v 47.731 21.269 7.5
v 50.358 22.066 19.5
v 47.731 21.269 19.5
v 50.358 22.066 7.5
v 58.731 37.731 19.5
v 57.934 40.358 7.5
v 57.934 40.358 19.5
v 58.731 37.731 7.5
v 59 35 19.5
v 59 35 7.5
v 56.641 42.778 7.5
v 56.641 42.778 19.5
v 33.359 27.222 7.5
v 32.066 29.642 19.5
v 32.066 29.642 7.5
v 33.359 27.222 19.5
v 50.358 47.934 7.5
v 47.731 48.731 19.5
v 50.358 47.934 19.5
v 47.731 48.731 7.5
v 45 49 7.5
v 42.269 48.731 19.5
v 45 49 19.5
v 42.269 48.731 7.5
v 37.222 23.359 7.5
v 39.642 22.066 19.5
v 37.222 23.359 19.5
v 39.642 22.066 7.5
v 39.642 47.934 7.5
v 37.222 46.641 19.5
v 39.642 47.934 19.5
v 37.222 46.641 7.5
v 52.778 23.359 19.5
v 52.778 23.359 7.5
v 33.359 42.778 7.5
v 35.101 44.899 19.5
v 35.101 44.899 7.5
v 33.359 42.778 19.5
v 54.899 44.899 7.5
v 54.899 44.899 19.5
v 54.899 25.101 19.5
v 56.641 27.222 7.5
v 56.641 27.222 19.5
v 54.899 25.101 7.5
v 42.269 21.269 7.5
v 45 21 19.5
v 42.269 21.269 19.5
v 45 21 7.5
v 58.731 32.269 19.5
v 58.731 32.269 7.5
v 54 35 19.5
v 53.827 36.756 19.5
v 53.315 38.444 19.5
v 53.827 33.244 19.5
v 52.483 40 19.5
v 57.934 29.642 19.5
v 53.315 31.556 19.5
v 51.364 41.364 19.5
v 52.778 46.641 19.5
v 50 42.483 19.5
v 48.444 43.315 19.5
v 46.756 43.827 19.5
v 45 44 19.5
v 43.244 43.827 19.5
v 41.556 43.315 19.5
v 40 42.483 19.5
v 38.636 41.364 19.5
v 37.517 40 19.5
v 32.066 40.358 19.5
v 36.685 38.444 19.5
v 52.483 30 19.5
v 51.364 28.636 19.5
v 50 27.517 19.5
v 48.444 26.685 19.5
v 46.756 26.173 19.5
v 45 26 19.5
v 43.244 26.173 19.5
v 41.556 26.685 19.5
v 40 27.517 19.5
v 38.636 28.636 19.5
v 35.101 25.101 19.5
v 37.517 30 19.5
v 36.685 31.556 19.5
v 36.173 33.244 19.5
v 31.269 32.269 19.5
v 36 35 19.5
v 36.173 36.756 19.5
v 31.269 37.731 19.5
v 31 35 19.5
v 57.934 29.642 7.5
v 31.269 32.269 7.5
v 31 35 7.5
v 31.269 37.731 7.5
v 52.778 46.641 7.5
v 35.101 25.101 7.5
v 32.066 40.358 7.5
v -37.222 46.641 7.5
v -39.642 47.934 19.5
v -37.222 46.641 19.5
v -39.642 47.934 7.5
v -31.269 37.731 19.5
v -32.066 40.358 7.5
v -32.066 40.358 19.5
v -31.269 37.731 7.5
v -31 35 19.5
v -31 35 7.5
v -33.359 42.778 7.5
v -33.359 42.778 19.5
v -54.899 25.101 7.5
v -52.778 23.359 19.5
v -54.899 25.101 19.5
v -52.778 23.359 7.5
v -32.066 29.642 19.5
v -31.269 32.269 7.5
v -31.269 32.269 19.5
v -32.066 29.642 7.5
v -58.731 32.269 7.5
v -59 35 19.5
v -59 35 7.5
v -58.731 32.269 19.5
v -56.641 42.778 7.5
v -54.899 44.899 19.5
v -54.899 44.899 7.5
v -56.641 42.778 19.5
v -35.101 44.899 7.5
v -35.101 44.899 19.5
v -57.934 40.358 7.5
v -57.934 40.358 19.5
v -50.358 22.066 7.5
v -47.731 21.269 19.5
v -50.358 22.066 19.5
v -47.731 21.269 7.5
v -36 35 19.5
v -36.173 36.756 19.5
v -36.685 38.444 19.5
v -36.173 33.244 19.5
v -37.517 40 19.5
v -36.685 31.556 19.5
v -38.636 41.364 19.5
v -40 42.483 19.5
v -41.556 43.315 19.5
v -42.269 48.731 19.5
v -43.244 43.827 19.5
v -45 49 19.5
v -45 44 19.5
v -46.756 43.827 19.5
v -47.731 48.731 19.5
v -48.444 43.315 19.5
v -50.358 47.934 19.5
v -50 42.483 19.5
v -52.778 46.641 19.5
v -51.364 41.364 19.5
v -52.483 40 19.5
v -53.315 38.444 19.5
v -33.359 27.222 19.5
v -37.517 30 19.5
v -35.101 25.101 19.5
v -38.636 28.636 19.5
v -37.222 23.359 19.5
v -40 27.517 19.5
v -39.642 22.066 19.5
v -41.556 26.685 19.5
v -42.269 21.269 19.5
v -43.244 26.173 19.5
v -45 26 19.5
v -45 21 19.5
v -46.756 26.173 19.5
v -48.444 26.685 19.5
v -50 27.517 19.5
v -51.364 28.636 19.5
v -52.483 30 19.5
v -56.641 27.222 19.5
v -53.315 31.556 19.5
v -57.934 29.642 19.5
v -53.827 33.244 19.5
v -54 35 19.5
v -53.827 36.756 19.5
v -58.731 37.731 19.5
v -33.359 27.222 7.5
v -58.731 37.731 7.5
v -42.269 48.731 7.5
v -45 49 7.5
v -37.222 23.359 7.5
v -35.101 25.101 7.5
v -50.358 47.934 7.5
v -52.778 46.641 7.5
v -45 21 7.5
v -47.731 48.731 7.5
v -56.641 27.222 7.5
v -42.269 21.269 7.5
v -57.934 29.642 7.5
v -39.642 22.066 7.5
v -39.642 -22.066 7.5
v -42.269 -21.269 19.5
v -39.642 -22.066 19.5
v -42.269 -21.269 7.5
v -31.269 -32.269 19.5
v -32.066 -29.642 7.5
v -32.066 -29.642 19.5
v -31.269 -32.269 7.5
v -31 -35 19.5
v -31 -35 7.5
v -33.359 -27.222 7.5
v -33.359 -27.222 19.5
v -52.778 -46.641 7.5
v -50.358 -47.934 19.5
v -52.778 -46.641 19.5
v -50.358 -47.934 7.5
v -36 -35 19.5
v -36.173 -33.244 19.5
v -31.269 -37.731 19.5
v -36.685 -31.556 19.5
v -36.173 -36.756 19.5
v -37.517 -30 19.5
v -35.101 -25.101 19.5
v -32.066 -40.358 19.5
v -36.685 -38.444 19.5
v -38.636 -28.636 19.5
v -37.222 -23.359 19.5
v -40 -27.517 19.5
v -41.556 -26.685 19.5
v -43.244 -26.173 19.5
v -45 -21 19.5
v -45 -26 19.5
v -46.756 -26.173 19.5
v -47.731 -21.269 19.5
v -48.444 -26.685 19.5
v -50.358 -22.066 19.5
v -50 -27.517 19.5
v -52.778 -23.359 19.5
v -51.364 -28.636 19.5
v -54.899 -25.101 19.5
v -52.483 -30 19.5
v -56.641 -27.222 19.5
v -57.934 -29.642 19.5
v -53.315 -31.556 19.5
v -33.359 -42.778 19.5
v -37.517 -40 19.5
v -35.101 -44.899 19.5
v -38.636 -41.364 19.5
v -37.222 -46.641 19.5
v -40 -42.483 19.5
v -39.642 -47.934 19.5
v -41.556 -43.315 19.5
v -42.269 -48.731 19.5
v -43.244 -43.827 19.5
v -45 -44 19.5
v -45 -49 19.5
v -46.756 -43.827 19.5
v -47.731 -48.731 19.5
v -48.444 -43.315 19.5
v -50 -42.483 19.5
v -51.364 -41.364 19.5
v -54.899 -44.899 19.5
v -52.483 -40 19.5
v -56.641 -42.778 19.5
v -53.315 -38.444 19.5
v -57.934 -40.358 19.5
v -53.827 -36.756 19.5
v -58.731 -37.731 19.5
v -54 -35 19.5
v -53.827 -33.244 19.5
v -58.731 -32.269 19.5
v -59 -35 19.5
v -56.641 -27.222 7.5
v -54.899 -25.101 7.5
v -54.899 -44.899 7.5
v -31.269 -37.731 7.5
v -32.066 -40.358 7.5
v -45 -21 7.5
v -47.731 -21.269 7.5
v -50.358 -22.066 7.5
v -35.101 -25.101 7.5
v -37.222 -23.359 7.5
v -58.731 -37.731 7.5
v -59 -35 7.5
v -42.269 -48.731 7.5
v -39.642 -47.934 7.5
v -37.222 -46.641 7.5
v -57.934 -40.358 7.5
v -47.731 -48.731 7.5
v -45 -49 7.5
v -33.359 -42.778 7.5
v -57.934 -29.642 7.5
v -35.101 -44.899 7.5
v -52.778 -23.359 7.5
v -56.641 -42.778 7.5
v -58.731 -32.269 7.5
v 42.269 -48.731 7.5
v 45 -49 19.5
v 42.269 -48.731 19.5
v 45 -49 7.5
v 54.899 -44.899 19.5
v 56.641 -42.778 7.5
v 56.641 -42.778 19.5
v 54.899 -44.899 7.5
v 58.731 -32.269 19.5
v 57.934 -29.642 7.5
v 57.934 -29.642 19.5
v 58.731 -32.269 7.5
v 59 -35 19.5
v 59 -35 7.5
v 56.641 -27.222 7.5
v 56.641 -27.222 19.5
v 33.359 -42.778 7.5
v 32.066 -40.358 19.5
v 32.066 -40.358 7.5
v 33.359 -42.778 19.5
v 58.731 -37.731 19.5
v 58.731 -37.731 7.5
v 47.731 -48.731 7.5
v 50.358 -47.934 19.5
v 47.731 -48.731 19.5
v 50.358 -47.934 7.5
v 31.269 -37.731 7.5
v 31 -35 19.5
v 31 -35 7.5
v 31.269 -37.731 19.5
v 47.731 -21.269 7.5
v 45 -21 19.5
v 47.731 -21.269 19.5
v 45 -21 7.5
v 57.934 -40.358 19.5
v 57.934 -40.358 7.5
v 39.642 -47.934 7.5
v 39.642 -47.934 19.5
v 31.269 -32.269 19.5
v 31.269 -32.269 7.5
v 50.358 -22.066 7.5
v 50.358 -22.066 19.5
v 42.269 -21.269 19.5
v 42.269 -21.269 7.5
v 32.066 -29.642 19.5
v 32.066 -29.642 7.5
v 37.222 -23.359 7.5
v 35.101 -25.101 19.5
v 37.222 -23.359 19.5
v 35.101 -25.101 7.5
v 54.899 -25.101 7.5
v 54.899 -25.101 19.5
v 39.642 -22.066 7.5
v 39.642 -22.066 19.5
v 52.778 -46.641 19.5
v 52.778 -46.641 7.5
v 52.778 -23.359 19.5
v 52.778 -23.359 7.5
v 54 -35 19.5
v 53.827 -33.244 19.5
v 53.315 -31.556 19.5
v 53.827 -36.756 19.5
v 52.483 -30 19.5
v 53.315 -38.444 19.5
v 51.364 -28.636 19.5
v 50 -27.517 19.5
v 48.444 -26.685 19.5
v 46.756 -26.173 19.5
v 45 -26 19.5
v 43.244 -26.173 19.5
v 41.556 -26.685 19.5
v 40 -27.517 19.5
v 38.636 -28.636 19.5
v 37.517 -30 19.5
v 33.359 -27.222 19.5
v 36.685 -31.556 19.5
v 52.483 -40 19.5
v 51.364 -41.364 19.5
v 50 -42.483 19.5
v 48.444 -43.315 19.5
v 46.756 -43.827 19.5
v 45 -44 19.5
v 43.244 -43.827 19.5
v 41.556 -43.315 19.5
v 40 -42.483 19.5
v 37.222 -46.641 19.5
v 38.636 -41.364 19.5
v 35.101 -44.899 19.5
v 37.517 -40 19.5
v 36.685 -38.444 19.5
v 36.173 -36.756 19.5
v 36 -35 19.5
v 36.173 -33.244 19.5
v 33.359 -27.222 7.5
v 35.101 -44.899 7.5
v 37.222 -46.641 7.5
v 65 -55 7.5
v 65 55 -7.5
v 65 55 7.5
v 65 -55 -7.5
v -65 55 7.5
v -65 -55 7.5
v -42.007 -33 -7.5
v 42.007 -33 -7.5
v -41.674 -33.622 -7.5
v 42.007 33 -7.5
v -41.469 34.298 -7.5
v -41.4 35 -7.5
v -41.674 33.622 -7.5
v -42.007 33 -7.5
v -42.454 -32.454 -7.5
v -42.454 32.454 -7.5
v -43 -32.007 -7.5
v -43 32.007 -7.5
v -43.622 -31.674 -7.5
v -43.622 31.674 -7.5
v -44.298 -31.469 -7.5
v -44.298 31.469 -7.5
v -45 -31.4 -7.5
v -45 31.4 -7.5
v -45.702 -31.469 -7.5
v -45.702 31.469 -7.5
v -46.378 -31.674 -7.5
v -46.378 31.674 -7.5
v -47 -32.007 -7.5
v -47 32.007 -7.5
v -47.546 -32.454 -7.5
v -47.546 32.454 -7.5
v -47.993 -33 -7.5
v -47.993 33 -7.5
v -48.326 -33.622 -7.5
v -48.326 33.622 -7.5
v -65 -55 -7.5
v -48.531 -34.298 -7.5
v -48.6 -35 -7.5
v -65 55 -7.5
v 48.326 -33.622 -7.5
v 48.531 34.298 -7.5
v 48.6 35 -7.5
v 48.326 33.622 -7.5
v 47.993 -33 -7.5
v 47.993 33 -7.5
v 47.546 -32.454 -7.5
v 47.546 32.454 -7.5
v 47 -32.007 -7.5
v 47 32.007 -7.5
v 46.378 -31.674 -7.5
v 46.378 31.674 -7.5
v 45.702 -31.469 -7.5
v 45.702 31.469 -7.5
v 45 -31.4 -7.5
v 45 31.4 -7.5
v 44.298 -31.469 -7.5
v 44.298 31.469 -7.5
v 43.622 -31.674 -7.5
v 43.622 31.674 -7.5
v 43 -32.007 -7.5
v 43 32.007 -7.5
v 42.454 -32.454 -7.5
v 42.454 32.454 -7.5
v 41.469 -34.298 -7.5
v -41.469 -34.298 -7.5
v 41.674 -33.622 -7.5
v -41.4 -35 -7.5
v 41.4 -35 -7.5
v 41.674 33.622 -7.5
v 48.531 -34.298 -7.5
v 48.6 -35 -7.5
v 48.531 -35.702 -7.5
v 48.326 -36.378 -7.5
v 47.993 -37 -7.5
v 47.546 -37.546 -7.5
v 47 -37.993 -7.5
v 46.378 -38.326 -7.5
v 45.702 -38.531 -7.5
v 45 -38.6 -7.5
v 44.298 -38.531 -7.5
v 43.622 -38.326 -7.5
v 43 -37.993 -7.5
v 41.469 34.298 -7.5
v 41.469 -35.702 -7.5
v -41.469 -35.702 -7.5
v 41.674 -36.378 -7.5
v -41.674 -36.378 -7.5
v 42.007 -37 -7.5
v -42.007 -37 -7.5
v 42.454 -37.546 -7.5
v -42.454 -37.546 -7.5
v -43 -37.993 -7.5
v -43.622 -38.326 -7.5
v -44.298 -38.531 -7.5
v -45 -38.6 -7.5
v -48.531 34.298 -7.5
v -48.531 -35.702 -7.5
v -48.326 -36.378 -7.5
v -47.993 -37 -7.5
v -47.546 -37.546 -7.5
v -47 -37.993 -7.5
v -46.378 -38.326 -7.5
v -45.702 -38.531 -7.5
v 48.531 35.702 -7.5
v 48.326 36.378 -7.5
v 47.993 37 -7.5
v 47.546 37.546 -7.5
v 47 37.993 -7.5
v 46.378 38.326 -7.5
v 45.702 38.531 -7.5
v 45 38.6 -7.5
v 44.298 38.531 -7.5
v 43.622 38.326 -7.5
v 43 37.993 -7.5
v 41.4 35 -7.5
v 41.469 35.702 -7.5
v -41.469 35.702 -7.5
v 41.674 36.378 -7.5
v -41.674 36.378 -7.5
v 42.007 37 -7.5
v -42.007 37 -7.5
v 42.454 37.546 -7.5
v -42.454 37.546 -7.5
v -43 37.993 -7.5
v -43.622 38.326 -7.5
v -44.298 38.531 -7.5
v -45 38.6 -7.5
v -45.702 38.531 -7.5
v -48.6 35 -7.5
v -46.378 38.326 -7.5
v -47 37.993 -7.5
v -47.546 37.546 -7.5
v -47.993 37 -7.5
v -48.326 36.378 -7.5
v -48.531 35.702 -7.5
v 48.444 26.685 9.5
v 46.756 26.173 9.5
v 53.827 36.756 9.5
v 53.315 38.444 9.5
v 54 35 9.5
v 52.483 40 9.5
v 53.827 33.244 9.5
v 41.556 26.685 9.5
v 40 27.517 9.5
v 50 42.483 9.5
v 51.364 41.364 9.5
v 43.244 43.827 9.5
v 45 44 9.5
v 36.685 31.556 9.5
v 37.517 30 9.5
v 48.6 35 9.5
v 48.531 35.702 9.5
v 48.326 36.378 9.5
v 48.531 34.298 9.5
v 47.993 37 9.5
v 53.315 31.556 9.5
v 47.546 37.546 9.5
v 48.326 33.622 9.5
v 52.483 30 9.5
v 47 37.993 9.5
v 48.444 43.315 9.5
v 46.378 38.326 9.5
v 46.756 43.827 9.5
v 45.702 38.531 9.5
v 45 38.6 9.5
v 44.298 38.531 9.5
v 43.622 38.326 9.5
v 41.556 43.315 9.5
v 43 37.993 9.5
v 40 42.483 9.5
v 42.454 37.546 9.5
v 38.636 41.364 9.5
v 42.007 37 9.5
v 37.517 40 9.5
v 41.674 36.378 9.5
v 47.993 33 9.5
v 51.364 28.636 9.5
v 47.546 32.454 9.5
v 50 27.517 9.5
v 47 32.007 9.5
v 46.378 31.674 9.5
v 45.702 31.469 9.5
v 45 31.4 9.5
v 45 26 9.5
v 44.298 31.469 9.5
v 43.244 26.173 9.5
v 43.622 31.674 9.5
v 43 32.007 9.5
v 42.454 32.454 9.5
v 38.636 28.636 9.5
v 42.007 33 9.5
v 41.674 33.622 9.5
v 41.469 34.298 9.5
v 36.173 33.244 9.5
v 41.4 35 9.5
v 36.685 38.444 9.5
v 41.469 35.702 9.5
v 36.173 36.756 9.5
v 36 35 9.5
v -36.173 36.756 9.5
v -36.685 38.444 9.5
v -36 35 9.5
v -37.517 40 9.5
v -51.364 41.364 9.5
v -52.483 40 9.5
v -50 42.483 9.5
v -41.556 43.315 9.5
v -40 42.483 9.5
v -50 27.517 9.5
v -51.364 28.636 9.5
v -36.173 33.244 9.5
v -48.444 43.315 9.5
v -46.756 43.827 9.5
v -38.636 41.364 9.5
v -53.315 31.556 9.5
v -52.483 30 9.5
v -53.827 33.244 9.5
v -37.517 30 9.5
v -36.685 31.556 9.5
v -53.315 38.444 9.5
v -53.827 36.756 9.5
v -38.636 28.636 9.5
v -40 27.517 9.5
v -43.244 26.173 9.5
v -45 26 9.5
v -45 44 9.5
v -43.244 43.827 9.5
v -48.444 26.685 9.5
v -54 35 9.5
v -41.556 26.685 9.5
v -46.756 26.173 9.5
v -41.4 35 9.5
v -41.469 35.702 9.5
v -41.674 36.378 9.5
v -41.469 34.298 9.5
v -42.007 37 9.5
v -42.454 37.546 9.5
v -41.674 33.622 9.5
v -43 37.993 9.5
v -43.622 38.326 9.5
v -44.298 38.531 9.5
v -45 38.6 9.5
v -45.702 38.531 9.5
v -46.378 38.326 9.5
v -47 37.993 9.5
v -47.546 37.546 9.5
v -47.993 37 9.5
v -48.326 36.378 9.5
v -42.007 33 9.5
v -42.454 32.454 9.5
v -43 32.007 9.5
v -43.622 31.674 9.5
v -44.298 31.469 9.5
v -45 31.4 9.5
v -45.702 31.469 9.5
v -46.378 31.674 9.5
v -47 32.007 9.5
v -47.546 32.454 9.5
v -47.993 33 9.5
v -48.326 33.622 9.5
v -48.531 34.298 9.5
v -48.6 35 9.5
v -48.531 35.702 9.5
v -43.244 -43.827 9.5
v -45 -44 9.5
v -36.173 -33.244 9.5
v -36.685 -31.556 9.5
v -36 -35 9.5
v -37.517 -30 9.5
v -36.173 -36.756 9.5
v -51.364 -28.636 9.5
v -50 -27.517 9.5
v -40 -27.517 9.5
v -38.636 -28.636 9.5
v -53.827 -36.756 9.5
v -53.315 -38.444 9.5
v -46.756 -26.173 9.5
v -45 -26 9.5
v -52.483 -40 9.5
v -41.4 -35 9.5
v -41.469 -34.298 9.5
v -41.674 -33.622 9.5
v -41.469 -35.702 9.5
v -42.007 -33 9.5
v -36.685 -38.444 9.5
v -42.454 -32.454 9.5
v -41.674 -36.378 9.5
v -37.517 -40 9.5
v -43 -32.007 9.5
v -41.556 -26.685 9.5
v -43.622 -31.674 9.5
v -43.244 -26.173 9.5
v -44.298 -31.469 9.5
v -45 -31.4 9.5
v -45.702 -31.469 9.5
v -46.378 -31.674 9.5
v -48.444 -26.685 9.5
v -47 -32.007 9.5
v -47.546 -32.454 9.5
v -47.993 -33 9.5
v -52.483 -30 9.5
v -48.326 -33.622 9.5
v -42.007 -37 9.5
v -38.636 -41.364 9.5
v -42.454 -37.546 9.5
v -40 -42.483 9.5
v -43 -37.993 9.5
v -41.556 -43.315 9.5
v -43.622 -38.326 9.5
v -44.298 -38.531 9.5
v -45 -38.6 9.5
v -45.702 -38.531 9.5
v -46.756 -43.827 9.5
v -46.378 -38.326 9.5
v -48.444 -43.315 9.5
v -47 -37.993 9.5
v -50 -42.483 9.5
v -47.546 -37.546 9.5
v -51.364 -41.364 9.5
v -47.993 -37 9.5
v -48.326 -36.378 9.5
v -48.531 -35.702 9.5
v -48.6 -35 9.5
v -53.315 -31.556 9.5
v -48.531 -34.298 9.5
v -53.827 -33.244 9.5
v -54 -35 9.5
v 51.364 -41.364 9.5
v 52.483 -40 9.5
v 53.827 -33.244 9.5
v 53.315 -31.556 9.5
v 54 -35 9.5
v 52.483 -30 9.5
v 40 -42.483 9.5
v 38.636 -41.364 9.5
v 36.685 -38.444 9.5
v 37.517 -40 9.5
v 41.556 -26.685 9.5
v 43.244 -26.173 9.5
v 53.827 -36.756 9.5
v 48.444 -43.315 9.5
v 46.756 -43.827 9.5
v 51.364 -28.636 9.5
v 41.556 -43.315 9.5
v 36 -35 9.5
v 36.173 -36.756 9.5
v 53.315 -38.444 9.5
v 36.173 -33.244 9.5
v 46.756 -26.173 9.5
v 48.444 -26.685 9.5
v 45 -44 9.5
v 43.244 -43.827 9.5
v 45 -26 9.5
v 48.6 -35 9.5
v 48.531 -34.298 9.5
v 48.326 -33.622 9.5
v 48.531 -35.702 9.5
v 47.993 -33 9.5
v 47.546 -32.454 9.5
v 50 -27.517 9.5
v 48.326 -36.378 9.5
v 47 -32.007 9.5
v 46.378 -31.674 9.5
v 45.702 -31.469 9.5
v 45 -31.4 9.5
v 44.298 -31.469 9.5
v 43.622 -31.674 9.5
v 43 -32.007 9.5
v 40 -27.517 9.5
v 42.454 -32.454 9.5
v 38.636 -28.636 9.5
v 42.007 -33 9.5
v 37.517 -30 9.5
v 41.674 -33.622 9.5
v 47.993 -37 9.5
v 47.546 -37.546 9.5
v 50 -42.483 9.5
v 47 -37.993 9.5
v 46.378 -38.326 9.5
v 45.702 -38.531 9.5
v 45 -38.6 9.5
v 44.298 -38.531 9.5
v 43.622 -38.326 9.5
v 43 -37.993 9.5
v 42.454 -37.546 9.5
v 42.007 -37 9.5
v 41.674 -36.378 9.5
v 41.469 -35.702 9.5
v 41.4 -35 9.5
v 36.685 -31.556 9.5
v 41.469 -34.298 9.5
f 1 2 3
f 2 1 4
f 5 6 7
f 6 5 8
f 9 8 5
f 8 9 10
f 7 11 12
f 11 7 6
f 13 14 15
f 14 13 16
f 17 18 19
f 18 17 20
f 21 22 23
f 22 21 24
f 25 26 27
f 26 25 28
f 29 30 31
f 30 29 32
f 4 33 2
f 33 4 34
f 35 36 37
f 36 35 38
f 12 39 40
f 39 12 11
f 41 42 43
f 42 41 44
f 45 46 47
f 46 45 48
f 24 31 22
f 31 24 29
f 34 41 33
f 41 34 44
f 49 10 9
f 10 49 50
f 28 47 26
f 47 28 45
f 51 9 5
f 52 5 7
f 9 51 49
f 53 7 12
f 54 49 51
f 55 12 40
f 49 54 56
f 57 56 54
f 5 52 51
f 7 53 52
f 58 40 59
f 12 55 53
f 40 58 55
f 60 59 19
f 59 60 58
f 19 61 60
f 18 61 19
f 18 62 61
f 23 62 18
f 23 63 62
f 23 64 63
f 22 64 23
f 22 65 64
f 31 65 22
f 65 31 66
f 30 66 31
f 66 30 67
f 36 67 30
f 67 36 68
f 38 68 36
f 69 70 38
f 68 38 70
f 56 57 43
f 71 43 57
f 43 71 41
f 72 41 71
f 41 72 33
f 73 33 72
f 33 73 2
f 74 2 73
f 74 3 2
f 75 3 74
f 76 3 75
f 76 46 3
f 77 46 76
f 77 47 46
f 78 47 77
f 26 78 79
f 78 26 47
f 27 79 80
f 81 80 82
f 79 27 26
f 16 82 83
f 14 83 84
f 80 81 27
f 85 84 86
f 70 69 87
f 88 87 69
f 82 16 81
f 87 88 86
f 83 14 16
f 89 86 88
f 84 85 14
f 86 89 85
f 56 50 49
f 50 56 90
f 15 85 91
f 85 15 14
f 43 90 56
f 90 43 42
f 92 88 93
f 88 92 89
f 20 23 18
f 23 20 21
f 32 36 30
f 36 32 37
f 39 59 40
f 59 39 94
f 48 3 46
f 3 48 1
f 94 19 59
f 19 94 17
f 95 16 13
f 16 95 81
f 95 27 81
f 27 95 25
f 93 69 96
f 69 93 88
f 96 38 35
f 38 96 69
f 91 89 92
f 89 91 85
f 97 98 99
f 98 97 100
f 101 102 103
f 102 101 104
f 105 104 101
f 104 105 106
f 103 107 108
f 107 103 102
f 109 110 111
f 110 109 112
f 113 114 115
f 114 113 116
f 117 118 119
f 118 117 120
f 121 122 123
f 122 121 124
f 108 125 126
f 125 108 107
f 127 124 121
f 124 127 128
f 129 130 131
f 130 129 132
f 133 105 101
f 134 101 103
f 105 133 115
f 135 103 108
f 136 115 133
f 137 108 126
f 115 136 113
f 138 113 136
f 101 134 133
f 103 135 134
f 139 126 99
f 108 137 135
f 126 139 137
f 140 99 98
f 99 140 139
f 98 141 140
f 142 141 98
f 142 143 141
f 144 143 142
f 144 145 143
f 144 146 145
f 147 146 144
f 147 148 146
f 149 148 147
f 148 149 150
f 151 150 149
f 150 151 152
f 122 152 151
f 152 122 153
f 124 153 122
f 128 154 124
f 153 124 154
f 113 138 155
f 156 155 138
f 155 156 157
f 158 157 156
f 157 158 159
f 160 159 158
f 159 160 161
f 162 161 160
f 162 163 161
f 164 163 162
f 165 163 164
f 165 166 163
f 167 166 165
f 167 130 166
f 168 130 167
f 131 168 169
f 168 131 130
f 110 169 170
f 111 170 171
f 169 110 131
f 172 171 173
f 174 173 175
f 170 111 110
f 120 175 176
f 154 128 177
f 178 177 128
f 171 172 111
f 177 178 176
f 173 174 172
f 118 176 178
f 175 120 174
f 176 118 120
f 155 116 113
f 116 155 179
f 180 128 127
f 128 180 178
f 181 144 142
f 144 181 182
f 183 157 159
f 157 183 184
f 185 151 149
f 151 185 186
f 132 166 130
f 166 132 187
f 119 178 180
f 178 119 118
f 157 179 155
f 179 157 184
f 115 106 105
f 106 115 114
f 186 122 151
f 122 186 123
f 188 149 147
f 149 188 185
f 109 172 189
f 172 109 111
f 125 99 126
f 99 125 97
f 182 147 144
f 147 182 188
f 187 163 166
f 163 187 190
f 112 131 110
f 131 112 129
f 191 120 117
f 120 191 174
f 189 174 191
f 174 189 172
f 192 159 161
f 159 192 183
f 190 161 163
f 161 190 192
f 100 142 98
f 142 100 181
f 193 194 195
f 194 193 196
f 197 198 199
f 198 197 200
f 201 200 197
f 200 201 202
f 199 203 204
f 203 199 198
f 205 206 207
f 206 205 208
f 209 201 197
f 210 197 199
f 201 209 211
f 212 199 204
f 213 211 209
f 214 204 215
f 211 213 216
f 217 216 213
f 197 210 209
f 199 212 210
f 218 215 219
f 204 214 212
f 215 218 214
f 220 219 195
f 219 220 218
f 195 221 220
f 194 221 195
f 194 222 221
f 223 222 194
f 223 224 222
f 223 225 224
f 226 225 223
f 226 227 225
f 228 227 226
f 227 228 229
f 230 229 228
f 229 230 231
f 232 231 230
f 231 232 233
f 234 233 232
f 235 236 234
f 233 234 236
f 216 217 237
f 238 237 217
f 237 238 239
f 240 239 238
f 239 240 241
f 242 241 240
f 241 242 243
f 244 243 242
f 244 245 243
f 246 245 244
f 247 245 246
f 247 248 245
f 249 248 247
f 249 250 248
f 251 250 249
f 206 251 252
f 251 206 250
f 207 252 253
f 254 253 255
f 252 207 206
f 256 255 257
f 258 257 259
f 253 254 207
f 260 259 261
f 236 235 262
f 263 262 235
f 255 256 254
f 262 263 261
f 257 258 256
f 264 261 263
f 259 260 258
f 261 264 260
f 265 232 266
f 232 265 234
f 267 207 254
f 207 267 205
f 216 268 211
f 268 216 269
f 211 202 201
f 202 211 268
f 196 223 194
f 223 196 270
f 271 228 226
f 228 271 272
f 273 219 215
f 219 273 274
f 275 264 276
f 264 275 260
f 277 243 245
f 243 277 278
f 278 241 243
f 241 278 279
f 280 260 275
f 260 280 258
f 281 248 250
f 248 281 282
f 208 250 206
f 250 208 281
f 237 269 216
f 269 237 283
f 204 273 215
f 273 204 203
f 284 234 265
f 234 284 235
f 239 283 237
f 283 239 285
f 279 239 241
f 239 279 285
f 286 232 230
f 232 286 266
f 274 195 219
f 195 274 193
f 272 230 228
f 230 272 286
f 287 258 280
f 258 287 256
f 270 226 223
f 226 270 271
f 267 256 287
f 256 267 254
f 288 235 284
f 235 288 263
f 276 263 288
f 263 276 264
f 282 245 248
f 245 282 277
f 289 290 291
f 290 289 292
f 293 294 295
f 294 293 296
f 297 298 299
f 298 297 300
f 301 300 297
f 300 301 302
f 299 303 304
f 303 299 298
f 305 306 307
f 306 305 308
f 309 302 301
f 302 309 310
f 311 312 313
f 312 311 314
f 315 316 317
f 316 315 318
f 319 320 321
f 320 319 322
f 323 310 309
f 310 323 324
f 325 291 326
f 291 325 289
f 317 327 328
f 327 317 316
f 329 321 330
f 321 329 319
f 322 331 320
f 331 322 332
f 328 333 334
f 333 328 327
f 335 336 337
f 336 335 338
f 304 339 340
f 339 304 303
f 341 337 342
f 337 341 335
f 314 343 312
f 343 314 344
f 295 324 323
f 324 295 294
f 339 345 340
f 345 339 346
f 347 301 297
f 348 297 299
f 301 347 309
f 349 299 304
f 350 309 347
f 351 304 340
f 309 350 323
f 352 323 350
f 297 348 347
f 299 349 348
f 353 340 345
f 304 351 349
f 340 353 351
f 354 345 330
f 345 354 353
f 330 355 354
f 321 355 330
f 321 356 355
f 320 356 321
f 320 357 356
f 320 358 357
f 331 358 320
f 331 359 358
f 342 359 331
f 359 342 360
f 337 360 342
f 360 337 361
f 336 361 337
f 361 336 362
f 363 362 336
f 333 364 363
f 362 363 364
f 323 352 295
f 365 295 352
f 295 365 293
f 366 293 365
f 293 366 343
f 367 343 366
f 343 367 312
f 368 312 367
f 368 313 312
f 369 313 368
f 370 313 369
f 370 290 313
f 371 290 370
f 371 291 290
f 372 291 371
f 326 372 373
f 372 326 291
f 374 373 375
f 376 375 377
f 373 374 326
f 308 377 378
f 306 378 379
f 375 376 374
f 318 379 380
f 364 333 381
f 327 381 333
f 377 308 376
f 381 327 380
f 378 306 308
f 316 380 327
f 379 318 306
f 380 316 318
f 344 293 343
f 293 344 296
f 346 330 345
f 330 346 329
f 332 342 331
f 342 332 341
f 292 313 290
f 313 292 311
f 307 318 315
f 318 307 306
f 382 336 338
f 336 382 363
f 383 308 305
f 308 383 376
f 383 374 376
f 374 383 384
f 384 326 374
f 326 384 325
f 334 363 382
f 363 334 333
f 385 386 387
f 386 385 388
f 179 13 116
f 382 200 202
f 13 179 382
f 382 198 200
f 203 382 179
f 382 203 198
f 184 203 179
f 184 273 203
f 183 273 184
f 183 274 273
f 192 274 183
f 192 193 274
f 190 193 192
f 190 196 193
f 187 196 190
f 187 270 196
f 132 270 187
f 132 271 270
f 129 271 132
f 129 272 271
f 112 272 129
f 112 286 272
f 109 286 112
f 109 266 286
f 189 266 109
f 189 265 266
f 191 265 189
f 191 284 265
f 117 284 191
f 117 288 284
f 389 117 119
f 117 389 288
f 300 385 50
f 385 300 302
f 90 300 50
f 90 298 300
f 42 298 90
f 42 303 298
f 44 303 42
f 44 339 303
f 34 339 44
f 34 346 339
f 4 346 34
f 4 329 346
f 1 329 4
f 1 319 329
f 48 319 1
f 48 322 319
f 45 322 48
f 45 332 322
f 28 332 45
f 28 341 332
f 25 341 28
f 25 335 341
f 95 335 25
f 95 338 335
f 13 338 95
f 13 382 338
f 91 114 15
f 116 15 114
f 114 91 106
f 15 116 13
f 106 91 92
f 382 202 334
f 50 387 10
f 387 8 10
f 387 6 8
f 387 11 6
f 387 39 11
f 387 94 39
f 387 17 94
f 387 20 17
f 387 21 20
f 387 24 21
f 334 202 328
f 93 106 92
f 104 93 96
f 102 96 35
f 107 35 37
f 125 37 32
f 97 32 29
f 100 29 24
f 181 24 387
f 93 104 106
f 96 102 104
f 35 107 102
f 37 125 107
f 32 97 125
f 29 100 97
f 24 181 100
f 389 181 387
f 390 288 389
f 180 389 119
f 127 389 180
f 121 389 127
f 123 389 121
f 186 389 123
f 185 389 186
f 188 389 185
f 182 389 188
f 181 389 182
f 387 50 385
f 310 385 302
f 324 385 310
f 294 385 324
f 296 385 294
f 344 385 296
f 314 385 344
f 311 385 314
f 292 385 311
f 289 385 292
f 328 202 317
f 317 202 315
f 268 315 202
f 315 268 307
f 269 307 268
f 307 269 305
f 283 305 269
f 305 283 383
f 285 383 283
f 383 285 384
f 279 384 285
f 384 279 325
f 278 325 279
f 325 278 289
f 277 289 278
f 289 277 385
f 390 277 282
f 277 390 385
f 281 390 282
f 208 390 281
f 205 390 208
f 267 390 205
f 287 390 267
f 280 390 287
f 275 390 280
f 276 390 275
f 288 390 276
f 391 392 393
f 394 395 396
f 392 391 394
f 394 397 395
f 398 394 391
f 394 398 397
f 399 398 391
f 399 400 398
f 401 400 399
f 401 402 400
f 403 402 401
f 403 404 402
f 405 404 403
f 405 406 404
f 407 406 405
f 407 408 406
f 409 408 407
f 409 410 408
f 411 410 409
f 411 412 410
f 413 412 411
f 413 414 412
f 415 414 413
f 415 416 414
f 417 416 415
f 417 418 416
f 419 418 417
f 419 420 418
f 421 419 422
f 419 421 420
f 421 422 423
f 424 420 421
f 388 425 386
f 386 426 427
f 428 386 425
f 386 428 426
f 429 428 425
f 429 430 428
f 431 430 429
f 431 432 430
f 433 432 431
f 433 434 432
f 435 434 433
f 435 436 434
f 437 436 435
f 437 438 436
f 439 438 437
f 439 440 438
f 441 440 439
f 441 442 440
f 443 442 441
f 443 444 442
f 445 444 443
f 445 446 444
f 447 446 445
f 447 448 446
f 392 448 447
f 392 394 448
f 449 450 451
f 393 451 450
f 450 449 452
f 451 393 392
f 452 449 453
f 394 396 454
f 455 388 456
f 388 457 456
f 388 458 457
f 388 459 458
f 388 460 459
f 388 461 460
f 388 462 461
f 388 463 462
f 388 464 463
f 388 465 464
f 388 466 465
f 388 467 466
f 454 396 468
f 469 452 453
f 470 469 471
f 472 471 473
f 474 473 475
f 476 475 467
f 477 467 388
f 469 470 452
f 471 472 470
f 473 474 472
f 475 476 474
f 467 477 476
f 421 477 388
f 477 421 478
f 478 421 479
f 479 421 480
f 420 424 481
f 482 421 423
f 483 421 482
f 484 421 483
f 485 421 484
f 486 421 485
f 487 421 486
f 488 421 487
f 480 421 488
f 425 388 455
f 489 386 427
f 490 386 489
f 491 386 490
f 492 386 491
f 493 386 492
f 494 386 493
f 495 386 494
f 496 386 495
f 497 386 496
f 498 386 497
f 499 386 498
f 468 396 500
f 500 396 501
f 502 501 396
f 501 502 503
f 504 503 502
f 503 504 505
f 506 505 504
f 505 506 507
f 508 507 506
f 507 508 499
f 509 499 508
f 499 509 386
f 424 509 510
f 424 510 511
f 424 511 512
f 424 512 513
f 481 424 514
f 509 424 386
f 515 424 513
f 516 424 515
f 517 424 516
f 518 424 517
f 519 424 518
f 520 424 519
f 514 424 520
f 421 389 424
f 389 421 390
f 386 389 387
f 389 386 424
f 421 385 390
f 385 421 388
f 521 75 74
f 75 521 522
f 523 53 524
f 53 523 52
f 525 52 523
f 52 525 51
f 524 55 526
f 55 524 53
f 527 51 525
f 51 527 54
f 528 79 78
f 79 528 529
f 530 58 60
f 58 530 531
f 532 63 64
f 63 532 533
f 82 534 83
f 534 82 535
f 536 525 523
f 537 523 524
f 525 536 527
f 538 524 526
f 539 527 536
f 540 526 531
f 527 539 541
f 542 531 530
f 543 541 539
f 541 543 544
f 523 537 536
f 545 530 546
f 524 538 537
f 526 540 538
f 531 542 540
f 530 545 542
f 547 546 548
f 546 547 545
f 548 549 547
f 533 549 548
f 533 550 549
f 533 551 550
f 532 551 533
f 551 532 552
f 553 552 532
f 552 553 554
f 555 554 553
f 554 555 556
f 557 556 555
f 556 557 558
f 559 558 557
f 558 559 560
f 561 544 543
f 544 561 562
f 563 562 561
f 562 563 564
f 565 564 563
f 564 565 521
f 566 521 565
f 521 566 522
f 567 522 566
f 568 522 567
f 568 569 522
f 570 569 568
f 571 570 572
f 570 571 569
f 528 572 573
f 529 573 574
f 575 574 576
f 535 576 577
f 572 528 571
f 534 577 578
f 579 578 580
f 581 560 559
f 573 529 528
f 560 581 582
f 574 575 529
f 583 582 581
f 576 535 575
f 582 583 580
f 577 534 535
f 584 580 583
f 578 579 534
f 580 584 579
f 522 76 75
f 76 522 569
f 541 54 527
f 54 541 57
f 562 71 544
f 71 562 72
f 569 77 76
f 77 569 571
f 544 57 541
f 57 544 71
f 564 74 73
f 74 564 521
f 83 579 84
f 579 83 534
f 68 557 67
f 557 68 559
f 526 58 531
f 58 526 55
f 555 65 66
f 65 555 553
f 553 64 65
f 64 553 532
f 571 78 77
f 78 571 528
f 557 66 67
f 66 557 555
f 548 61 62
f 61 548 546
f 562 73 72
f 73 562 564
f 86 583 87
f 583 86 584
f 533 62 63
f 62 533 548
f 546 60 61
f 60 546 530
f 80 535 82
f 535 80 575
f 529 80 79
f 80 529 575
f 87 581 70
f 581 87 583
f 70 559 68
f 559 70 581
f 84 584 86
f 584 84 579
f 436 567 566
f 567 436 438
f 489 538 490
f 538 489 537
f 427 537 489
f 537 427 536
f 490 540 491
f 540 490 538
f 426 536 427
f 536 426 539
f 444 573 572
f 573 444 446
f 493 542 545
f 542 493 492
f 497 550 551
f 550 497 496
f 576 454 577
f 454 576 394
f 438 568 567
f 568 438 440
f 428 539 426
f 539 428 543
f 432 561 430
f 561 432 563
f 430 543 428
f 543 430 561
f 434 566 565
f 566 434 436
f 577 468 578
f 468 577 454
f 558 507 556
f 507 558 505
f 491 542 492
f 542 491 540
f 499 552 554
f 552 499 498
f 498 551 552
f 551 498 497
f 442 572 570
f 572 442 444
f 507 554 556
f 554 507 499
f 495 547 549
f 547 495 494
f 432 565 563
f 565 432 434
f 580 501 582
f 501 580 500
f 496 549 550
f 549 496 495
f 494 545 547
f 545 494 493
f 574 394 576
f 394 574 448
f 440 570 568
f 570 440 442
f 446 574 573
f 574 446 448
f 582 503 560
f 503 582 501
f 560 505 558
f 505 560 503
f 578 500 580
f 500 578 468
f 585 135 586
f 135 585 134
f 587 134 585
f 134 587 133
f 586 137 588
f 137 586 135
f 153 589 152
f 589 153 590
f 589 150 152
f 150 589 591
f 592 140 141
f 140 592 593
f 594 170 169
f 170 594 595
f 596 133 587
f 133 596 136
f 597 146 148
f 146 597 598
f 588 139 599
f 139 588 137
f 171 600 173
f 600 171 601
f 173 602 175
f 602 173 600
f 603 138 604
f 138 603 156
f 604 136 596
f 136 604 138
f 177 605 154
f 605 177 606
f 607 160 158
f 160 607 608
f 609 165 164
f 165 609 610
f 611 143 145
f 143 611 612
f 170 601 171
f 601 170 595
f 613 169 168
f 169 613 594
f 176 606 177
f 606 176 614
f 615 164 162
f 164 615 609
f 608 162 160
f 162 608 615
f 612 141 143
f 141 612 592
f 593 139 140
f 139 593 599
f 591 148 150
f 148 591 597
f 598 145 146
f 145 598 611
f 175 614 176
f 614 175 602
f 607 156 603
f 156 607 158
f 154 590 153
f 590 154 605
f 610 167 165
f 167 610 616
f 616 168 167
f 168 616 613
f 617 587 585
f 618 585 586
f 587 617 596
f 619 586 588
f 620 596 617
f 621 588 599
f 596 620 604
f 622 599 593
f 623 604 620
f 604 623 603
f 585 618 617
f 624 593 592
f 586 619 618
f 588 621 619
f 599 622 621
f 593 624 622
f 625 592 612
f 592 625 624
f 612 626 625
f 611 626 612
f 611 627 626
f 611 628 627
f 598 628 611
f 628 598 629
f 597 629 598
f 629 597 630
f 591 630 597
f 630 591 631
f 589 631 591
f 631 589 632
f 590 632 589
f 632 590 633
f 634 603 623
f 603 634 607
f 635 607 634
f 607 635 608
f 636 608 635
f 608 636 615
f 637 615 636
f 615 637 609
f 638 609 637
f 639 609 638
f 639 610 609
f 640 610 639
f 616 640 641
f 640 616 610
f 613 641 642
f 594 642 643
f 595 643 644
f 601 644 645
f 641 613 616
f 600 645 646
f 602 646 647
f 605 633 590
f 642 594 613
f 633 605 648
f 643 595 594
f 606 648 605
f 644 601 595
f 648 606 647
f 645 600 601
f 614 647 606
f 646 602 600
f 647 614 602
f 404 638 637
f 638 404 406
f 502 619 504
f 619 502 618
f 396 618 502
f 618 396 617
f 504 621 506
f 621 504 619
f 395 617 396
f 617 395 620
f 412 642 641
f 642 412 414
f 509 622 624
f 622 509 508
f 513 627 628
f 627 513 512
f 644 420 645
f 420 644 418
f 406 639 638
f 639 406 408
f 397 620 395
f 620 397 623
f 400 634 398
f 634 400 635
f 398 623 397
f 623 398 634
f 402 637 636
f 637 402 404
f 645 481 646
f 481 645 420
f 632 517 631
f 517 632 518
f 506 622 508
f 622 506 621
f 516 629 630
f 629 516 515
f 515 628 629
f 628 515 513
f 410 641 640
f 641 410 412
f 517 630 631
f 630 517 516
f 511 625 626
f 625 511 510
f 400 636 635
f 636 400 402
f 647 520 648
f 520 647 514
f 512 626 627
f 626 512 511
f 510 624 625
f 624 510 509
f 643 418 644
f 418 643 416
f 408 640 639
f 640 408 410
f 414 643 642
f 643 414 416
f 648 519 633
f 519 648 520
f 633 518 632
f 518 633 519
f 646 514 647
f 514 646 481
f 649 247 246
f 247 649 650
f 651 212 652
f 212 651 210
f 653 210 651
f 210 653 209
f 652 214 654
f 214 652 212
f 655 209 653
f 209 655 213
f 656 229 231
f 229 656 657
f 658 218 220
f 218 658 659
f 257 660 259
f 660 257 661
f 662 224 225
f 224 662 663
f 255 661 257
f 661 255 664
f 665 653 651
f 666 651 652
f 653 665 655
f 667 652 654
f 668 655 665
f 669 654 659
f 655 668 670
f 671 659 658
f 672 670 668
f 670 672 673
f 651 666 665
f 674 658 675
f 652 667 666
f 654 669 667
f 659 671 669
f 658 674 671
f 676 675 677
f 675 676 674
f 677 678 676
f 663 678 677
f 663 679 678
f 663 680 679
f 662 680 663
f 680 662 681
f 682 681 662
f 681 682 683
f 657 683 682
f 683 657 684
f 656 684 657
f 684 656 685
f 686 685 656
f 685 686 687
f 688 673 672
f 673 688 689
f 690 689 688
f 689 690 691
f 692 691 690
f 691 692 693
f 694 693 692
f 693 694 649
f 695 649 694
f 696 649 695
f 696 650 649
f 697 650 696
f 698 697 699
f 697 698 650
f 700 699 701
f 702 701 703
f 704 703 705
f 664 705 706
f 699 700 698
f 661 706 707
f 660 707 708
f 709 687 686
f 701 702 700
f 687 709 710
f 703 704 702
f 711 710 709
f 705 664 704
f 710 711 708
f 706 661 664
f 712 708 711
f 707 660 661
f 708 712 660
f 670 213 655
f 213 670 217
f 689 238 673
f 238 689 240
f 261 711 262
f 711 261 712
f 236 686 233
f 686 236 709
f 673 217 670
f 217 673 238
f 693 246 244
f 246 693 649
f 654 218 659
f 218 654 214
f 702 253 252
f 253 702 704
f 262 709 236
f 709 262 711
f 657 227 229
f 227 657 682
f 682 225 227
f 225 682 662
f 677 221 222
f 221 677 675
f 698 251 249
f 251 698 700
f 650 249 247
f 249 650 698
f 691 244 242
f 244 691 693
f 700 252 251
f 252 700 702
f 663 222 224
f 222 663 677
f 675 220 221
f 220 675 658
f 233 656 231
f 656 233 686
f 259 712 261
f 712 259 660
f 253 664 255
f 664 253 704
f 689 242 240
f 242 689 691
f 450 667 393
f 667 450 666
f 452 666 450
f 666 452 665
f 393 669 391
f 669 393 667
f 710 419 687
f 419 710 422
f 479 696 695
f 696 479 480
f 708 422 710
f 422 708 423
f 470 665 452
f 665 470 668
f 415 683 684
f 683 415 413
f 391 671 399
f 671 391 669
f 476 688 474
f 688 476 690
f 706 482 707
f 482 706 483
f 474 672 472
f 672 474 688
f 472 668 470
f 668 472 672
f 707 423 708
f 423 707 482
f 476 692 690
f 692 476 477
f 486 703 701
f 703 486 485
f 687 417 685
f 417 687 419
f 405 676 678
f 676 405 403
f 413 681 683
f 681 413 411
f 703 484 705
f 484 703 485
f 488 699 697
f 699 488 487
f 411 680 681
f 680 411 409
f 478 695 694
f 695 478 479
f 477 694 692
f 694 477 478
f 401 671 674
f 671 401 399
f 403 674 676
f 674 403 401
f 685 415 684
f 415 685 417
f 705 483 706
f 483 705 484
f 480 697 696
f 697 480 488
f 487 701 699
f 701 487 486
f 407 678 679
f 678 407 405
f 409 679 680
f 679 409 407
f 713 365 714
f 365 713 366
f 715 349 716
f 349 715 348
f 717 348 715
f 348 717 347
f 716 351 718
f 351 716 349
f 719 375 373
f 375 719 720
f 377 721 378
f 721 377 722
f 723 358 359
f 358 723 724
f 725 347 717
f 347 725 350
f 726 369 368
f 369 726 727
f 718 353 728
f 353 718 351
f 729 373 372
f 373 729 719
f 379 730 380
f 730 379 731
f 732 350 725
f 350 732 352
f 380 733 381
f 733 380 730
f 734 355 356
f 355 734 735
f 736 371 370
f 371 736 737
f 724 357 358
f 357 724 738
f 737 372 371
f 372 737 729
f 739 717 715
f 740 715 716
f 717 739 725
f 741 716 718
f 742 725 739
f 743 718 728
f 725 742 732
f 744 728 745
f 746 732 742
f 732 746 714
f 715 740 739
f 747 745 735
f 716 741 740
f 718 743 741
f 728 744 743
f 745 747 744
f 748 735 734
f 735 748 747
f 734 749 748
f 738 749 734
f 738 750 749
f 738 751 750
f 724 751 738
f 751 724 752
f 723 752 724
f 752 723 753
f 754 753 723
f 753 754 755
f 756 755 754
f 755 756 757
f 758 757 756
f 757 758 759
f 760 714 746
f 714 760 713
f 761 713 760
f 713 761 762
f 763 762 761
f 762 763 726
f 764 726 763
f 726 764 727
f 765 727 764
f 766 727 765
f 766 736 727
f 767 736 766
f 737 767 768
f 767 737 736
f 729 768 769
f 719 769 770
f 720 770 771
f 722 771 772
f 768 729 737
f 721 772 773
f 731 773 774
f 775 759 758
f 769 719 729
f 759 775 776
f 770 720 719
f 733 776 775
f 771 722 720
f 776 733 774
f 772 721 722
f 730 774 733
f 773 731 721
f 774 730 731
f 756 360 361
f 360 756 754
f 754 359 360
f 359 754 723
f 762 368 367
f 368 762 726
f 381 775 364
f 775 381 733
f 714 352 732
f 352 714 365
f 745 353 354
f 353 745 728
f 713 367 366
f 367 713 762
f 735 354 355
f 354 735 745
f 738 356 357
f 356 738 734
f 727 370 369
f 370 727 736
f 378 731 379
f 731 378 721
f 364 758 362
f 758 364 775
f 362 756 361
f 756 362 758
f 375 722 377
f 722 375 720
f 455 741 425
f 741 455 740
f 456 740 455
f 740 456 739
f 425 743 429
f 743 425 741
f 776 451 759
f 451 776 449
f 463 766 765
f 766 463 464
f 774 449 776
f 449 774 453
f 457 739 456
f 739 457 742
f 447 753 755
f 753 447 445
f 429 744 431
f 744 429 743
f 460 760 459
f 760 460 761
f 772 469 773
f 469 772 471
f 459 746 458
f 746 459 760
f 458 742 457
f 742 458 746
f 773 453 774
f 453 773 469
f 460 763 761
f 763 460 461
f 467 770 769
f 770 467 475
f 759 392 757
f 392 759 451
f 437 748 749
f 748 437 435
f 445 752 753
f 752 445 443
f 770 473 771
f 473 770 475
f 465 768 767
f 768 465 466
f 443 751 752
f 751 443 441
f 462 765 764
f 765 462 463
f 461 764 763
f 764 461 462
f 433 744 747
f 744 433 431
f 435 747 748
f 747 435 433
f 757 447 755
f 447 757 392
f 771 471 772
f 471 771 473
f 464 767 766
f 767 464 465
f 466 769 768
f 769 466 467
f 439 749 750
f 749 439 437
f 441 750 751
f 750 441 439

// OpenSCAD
$fn = 32;

// ----------------------------------------------------------------------
// Socket pad plate
// bosses with counterbored sockets for the screws
// ----------------------------------------------------------------------

// --- parameters (mm) ---
base_t = 15;             // base plate thickness
boss_h = 12;             // boss height above the base plate
boss_d = 28;             // boss diameter
socket_d = 18;           // socket diameter
socket_depth = 10;       // socket depth from the boss face
bolt_d = 7.2;            // screw clearance hole through the socket floor
plate = [130, 110, 15];  // overall size (x, y, z)
edge = 20;               // boss centre offset from the plate edge
pads = 4;                // boss count, one per corner

// --- derived feature positions (mm) ---
height = base_t + boss_h;        // = 27   overall height of the part
corner_x = plate[0] / 2 - edge;  // = 45   boss centre X
corner_y = plate[1] / 2 - edge;  // = 35   boss centre Y
feature_centers = [
  [corner_x, corner_y],
  [-corner_x, corner_y],
  [-corner_x, -corner_y],
  [corner_x, -corner_y]
];   // boss centres: sockets, holes and the pads themselves are placed from here

// base plate, bosses on feature_centers, socket + through hole in each
difference() {
  union() {
    cube(plate, center = true);
    for (centre = feature_centers)
      translate([centre[0], centre[1], plate[2] / 2 - 1])
        cylinder(d = boss_d, h = boss_h + 1);
  }
  for (centre = feature_centers) {
    translate([centre[0], centre[1], plate[2] / 2 + boss_h - socket_depth])
      cylinder(d = socket_d, h = socket_depth + 1);
    translate([centre[0], centre[1], -height])
      cylinder(d = bolt_d, h = 2 * height + 2);  // through the socket floor
  }
}
